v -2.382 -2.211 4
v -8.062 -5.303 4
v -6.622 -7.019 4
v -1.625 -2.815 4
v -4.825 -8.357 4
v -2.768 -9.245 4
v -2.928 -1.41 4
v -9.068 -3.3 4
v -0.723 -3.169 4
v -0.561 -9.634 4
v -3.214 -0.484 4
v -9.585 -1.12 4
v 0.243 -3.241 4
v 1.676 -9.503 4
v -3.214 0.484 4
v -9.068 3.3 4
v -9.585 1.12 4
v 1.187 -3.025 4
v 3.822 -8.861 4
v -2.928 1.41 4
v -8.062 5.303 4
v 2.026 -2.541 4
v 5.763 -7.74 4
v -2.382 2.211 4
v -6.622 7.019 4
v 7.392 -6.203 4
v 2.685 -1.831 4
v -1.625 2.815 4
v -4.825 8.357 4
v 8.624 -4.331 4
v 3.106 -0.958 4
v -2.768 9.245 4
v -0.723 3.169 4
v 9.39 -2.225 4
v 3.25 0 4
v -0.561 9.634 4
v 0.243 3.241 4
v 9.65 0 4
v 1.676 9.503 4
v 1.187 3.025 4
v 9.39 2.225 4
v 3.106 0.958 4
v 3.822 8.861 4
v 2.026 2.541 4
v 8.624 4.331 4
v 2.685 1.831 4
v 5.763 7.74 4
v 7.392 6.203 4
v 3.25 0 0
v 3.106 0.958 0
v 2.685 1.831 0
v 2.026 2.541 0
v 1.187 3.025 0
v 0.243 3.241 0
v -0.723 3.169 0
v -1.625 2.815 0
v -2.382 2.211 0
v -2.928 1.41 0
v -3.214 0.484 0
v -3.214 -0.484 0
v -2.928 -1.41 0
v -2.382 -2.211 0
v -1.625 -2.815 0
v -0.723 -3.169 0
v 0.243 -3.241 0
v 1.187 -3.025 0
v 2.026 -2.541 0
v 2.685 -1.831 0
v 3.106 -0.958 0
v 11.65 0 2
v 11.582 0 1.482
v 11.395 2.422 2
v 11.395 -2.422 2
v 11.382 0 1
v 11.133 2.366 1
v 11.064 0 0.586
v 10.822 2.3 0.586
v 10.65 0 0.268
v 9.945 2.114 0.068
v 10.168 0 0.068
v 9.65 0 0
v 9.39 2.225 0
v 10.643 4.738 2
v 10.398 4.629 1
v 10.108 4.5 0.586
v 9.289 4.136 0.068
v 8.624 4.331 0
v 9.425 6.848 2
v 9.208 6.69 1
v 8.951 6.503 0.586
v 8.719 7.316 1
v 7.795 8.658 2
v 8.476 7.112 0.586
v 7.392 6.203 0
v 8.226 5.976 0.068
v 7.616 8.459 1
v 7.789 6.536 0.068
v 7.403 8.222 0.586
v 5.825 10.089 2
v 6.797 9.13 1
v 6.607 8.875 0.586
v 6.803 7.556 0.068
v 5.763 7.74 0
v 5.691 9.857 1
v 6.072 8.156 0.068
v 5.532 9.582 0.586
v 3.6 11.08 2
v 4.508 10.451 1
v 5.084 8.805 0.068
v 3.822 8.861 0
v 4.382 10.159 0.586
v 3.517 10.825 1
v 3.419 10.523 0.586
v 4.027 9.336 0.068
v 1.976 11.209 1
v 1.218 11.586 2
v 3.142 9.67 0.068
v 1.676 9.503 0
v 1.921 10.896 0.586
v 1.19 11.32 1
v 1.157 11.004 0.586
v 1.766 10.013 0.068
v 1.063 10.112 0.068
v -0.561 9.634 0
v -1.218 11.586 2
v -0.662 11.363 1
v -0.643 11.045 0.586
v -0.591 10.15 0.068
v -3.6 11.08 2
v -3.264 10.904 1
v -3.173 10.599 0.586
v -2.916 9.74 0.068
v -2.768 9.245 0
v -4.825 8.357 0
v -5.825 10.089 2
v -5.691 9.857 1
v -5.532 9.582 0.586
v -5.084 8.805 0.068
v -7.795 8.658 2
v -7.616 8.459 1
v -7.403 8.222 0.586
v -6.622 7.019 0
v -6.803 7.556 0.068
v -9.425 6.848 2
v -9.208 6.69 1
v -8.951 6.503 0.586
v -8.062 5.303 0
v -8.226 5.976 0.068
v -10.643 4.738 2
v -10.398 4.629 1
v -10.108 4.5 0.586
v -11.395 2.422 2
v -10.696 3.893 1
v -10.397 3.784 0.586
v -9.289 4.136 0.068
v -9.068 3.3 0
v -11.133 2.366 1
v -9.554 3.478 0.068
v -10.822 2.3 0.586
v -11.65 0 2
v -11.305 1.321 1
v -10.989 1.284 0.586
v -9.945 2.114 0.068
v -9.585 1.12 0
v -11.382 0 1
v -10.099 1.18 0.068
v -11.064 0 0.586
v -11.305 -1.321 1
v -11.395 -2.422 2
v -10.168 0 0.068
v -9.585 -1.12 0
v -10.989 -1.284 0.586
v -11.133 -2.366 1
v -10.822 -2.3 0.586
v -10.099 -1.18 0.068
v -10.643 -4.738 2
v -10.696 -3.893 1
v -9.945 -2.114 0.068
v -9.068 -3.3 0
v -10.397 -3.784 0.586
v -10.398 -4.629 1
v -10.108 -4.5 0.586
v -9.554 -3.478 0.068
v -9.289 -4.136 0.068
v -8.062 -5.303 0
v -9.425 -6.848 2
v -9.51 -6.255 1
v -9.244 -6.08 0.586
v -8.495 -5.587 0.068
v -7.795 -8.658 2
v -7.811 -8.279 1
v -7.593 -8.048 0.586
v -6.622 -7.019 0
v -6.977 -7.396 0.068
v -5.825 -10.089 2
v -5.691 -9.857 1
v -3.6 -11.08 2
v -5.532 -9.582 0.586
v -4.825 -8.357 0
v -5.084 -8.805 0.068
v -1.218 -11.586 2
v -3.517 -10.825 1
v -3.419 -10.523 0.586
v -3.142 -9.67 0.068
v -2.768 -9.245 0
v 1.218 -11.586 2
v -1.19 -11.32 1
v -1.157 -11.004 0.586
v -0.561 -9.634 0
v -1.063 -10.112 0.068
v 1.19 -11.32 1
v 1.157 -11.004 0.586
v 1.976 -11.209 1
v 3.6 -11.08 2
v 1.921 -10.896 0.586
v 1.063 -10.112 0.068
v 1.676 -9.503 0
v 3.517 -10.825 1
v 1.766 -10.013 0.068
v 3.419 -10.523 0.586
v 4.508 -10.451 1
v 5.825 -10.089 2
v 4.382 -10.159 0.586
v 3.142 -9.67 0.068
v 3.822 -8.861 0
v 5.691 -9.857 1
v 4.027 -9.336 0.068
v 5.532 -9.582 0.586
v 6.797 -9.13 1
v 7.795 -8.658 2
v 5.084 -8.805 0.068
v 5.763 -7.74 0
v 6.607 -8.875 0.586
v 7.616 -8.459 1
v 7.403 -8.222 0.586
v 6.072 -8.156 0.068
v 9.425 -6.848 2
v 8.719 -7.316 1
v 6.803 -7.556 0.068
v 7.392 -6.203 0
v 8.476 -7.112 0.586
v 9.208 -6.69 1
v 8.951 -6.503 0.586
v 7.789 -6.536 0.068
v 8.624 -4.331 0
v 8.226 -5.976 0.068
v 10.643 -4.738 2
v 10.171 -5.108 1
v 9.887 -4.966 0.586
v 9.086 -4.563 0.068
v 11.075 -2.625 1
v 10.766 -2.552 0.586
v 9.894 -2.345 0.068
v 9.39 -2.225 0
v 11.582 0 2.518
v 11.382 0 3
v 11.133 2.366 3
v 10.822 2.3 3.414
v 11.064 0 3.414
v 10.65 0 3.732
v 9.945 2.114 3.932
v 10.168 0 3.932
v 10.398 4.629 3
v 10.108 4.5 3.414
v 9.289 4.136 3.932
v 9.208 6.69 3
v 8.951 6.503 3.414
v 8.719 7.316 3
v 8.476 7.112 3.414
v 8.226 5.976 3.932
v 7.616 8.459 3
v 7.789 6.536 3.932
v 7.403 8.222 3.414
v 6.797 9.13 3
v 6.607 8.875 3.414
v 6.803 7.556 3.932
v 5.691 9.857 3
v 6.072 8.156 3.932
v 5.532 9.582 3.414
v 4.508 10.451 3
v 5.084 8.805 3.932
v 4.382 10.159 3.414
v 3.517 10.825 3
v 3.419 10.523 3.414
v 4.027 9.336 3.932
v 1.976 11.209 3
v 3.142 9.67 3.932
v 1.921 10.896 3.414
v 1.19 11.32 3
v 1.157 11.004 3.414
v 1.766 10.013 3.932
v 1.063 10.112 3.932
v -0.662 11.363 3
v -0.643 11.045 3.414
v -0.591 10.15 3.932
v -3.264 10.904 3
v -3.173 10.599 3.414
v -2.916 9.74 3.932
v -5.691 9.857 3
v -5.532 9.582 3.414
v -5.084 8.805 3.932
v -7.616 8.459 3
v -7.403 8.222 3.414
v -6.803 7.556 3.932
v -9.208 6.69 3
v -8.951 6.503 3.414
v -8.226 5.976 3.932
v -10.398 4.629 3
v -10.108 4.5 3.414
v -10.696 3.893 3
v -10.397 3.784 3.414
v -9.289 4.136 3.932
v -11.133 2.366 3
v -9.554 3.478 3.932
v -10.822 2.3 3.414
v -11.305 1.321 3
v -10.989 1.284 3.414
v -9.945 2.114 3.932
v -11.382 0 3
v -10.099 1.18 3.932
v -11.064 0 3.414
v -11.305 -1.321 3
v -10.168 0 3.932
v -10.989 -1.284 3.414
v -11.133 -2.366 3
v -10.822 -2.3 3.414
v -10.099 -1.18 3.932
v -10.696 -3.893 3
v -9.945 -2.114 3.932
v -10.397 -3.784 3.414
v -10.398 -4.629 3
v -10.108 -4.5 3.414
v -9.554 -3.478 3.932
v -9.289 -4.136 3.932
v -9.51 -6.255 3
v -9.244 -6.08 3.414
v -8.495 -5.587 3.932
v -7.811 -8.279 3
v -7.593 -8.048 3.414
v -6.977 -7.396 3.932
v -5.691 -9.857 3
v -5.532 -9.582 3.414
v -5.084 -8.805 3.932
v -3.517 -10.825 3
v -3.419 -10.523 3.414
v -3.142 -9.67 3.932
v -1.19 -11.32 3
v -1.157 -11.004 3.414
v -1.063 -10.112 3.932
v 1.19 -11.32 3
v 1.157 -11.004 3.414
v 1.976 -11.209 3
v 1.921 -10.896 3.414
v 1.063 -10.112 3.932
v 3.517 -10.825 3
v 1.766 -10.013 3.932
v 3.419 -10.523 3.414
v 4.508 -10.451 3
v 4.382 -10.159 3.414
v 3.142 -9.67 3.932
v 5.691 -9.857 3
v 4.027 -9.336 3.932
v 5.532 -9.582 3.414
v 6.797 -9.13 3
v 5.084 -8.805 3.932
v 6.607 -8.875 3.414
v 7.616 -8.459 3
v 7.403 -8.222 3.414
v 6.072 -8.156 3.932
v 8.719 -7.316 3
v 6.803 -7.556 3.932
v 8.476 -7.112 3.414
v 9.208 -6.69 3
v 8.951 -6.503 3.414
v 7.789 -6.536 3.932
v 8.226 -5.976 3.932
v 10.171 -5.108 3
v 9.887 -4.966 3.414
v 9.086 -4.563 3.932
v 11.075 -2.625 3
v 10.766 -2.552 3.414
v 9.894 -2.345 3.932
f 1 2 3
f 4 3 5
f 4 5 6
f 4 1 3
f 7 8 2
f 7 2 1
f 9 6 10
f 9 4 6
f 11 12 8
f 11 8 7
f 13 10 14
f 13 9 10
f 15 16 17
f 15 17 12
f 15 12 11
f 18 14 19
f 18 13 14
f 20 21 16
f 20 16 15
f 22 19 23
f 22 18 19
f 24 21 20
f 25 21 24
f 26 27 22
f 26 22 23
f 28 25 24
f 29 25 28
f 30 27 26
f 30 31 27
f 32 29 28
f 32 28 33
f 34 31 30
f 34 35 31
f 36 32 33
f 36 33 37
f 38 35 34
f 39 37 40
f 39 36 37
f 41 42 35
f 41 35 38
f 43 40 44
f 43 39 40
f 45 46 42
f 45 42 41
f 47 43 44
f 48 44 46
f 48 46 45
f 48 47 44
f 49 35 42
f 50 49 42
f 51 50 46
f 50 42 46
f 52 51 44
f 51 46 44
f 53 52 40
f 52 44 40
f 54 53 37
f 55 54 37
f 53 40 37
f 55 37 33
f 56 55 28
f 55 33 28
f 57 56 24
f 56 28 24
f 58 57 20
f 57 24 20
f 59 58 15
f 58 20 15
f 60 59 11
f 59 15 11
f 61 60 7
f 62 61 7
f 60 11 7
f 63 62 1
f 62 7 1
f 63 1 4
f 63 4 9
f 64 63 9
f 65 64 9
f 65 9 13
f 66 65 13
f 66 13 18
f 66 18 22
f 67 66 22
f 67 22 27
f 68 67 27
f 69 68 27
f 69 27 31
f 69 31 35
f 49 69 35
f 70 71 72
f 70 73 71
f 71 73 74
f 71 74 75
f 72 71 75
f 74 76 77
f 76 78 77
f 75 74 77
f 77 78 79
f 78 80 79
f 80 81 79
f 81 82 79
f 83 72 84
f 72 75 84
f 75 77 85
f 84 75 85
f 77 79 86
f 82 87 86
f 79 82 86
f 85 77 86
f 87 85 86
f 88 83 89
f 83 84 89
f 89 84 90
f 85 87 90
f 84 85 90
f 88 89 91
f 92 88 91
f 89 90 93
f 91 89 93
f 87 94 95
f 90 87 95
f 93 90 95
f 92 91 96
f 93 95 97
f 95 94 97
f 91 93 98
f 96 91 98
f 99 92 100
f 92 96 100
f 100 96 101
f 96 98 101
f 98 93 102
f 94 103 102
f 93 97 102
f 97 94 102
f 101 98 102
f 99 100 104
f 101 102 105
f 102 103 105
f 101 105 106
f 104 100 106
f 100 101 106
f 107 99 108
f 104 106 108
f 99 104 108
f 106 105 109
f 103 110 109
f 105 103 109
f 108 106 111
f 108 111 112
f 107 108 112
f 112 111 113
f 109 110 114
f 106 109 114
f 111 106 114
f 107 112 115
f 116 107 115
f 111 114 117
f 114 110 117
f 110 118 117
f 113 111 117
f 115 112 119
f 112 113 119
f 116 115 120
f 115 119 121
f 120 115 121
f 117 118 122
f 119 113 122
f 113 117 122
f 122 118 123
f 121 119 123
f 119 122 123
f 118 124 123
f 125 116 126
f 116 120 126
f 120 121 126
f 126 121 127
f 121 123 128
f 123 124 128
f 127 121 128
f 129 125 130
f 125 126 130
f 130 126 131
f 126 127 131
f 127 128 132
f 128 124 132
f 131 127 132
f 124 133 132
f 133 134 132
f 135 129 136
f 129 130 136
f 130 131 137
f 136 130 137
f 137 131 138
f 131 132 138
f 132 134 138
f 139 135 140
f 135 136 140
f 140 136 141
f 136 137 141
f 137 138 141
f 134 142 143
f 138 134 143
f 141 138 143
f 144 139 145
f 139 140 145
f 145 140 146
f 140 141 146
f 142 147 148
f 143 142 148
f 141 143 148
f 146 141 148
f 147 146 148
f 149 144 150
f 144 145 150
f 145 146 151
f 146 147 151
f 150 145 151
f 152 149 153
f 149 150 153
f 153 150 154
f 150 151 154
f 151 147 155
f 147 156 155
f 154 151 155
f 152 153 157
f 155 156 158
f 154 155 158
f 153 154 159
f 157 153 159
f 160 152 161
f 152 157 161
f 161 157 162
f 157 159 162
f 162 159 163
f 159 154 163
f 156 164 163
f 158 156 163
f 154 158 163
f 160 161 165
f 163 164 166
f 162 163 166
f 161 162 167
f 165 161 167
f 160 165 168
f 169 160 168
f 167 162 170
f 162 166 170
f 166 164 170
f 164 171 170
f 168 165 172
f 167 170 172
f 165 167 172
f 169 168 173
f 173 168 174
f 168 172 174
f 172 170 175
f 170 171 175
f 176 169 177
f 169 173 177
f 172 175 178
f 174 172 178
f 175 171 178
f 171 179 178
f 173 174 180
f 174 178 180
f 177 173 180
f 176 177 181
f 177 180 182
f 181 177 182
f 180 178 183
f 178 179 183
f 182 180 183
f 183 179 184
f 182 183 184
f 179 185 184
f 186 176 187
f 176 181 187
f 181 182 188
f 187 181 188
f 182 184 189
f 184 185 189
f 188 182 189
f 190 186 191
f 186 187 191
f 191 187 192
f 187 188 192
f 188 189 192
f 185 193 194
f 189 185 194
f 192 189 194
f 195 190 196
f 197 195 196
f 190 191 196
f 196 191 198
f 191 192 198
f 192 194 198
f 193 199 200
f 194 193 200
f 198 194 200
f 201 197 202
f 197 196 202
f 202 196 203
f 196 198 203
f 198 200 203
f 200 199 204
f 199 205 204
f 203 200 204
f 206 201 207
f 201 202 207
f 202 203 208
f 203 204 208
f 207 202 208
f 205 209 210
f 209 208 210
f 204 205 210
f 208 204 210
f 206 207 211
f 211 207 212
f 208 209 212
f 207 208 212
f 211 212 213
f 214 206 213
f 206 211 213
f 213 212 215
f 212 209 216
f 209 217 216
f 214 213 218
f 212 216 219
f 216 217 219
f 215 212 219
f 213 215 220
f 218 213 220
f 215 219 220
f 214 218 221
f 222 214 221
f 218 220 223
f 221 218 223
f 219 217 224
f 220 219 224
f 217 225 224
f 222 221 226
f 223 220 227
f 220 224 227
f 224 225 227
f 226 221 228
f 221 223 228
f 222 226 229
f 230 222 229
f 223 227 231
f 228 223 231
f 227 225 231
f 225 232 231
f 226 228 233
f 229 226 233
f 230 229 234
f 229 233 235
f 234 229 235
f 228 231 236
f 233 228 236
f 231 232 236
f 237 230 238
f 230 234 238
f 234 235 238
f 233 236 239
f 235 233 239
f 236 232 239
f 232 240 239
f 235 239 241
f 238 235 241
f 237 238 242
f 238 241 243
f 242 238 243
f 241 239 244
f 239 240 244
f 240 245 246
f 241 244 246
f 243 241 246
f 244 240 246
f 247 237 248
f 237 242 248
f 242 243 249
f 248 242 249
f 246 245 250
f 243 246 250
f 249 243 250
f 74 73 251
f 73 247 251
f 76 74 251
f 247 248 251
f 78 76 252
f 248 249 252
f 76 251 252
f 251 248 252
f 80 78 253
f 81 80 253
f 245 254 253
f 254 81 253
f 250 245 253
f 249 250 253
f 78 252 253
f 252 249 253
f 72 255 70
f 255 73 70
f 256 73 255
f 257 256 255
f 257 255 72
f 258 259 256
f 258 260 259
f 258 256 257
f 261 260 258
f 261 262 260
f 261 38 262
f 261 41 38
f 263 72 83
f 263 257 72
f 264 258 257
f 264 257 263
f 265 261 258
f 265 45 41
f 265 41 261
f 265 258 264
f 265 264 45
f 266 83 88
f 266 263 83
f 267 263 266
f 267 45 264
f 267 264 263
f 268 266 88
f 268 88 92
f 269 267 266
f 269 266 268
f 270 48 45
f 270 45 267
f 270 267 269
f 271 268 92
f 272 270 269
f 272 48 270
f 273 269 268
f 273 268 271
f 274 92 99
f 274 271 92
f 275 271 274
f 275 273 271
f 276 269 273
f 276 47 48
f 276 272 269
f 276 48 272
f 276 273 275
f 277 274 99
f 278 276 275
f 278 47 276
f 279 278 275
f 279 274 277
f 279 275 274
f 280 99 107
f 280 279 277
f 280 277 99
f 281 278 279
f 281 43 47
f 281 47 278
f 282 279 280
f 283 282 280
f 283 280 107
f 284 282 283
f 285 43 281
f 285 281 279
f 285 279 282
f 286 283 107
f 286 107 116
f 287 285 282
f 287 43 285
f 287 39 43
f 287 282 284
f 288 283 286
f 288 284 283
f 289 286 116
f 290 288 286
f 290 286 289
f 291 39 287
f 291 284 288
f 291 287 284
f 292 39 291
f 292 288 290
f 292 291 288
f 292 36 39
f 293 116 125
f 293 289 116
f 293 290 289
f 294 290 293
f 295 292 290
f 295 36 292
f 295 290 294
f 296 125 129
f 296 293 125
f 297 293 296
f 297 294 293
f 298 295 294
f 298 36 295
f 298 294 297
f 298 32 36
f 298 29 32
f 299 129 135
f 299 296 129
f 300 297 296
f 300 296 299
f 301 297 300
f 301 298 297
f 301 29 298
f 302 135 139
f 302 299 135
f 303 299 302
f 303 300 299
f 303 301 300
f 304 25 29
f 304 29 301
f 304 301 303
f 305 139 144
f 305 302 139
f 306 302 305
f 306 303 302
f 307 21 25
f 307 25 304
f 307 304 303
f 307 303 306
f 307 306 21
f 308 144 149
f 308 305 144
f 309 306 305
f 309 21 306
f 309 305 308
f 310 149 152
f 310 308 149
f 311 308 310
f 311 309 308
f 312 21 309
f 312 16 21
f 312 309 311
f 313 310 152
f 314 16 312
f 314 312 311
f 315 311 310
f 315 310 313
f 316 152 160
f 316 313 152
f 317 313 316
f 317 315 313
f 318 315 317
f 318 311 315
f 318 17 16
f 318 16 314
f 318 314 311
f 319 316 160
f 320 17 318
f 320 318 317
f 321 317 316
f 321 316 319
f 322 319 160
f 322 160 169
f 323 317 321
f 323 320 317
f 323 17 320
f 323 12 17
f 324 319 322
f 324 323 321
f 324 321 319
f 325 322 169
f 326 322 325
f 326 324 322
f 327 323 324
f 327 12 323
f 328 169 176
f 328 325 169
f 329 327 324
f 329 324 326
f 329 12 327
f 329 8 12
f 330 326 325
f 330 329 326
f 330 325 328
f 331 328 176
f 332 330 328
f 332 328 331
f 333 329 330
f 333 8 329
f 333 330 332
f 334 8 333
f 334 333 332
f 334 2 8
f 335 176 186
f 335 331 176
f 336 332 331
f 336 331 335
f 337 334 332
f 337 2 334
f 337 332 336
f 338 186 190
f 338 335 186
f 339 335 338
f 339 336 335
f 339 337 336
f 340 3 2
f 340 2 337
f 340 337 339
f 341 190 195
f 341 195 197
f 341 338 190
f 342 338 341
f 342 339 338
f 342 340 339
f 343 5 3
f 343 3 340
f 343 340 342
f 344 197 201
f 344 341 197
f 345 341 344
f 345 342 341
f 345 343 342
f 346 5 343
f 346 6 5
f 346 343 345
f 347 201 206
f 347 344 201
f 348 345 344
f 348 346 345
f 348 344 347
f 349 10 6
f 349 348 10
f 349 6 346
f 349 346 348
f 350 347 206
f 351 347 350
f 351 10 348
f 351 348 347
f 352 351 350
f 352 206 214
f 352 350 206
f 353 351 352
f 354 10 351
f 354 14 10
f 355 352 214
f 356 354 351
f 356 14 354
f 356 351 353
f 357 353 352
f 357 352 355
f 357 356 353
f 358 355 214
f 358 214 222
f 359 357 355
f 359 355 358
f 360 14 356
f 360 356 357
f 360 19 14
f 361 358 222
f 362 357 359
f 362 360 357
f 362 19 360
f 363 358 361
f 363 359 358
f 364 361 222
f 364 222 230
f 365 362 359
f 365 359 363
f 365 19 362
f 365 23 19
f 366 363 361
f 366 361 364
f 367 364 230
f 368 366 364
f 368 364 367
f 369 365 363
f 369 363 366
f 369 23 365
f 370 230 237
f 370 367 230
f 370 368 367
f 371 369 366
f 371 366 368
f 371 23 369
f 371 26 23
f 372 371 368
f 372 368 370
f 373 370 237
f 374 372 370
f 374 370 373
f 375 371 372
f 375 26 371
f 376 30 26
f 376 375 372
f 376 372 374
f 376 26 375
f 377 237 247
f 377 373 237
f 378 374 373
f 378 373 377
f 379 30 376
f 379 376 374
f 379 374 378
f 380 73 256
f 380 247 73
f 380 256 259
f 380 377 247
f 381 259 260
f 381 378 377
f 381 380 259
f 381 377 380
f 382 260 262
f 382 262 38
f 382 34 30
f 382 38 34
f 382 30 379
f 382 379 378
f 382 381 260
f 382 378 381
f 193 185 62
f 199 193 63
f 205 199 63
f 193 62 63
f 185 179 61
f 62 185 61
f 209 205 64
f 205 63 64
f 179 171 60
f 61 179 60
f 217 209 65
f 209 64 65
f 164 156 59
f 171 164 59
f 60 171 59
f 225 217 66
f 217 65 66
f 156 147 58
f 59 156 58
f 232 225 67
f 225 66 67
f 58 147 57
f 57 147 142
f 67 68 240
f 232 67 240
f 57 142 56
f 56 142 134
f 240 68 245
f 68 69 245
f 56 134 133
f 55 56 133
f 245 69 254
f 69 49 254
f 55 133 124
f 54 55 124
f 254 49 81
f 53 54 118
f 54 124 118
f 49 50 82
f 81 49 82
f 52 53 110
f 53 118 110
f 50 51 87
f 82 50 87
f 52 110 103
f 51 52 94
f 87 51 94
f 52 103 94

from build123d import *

# Parameters (mm, degrees)
F0_R     = 11.65
F1_DEPTH = 4
F2_R     = 1.99999
F3_R     = 3.25
F4_DEPTH = 25


# Not quite as in the source:
# - a fillet or chamfer is up to 0.001 mm smaller than in the source, because OpenCascade refuses the exact size


with BuildPart() as f1:
    # F0 (on Top) → F1 (new body)
    with BuildSketch(Plane.XY):
        Circle(F0_R)
    extrude(amount=F1_DEPTH)

    # F2 (radius 2 in the source; OpenCascade refuses exactly that, so slightly less here)
    f2_edges = [f1.edges().sort_by_distance(p)[0] for p in [
        (-11.65, 0, 4),
        (-11.65, 0, 0),
    ]]
    fillet(f2_edges, radius=F2_R)

    # F3 (on face) → F4 (cut)
    with BuildSketch(Plane.XY.offset(4)):
        Circle(F3_R)
    extrude(amount=-F4_DEPTH, mode=Mode.SUBTRACT)


solid = f1.part
